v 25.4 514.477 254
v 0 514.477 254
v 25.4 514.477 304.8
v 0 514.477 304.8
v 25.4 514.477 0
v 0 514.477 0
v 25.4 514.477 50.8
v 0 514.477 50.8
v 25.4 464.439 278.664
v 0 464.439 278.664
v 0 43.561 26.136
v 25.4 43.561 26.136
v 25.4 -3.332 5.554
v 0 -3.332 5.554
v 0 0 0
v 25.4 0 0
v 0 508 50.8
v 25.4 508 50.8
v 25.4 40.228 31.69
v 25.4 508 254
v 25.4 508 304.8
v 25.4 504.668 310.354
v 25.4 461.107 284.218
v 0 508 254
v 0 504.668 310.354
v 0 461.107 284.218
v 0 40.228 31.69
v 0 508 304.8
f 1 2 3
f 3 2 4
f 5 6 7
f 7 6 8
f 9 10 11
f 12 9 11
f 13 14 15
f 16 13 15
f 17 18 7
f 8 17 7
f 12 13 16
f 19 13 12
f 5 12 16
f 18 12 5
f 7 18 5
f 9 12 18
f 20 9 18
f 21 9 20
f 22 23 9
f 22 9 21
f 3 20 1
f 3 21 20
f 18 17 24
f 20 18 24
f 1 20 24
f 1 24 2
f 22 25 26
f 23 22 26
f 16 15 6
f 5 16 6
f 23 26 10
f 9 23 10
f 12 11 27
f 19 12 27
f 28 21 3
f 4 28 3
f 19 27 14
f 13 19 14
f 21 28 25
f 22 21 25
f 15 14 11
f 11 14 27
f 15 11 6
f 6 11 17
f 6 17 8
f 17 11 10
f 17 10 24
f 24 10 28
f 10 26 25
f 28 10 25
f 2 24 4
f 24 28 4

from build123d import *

# Parameters (mm, degrees)
F0_W     = 6.477
F0_H     = 50.8
F1_DEPTH = 25.4


with BuildPart() as f1:
    # F0 (on Right) → F1 (new body)
    with BuildSketch(Plane.YZ):
        Polygon((43.560641, 26.136384), (0, 0), (508, 0), (508, 50.8), (508, 254), (508, 304.8), (464.439359, 278.663616), align=None)
        Polygon((-3.332389, 5.553982), (0, 0), (43.560641, 26.136384), (40.228252, 31.690366), align=None)
        with Locations((511.2385, 25.4)):
            Rectangle(F0_W, F0_H)
        Polygon((461.10697, 284.217597), (464.439359, 278.663616), (508, 304.8), (504.667611, 310.353982), align=None)
        with Locations((511.2385, 279.4)):
            Rectangle(F0_W, F0_H)
    extrude(amount=F1_DEPTH)


solid = f1.part
